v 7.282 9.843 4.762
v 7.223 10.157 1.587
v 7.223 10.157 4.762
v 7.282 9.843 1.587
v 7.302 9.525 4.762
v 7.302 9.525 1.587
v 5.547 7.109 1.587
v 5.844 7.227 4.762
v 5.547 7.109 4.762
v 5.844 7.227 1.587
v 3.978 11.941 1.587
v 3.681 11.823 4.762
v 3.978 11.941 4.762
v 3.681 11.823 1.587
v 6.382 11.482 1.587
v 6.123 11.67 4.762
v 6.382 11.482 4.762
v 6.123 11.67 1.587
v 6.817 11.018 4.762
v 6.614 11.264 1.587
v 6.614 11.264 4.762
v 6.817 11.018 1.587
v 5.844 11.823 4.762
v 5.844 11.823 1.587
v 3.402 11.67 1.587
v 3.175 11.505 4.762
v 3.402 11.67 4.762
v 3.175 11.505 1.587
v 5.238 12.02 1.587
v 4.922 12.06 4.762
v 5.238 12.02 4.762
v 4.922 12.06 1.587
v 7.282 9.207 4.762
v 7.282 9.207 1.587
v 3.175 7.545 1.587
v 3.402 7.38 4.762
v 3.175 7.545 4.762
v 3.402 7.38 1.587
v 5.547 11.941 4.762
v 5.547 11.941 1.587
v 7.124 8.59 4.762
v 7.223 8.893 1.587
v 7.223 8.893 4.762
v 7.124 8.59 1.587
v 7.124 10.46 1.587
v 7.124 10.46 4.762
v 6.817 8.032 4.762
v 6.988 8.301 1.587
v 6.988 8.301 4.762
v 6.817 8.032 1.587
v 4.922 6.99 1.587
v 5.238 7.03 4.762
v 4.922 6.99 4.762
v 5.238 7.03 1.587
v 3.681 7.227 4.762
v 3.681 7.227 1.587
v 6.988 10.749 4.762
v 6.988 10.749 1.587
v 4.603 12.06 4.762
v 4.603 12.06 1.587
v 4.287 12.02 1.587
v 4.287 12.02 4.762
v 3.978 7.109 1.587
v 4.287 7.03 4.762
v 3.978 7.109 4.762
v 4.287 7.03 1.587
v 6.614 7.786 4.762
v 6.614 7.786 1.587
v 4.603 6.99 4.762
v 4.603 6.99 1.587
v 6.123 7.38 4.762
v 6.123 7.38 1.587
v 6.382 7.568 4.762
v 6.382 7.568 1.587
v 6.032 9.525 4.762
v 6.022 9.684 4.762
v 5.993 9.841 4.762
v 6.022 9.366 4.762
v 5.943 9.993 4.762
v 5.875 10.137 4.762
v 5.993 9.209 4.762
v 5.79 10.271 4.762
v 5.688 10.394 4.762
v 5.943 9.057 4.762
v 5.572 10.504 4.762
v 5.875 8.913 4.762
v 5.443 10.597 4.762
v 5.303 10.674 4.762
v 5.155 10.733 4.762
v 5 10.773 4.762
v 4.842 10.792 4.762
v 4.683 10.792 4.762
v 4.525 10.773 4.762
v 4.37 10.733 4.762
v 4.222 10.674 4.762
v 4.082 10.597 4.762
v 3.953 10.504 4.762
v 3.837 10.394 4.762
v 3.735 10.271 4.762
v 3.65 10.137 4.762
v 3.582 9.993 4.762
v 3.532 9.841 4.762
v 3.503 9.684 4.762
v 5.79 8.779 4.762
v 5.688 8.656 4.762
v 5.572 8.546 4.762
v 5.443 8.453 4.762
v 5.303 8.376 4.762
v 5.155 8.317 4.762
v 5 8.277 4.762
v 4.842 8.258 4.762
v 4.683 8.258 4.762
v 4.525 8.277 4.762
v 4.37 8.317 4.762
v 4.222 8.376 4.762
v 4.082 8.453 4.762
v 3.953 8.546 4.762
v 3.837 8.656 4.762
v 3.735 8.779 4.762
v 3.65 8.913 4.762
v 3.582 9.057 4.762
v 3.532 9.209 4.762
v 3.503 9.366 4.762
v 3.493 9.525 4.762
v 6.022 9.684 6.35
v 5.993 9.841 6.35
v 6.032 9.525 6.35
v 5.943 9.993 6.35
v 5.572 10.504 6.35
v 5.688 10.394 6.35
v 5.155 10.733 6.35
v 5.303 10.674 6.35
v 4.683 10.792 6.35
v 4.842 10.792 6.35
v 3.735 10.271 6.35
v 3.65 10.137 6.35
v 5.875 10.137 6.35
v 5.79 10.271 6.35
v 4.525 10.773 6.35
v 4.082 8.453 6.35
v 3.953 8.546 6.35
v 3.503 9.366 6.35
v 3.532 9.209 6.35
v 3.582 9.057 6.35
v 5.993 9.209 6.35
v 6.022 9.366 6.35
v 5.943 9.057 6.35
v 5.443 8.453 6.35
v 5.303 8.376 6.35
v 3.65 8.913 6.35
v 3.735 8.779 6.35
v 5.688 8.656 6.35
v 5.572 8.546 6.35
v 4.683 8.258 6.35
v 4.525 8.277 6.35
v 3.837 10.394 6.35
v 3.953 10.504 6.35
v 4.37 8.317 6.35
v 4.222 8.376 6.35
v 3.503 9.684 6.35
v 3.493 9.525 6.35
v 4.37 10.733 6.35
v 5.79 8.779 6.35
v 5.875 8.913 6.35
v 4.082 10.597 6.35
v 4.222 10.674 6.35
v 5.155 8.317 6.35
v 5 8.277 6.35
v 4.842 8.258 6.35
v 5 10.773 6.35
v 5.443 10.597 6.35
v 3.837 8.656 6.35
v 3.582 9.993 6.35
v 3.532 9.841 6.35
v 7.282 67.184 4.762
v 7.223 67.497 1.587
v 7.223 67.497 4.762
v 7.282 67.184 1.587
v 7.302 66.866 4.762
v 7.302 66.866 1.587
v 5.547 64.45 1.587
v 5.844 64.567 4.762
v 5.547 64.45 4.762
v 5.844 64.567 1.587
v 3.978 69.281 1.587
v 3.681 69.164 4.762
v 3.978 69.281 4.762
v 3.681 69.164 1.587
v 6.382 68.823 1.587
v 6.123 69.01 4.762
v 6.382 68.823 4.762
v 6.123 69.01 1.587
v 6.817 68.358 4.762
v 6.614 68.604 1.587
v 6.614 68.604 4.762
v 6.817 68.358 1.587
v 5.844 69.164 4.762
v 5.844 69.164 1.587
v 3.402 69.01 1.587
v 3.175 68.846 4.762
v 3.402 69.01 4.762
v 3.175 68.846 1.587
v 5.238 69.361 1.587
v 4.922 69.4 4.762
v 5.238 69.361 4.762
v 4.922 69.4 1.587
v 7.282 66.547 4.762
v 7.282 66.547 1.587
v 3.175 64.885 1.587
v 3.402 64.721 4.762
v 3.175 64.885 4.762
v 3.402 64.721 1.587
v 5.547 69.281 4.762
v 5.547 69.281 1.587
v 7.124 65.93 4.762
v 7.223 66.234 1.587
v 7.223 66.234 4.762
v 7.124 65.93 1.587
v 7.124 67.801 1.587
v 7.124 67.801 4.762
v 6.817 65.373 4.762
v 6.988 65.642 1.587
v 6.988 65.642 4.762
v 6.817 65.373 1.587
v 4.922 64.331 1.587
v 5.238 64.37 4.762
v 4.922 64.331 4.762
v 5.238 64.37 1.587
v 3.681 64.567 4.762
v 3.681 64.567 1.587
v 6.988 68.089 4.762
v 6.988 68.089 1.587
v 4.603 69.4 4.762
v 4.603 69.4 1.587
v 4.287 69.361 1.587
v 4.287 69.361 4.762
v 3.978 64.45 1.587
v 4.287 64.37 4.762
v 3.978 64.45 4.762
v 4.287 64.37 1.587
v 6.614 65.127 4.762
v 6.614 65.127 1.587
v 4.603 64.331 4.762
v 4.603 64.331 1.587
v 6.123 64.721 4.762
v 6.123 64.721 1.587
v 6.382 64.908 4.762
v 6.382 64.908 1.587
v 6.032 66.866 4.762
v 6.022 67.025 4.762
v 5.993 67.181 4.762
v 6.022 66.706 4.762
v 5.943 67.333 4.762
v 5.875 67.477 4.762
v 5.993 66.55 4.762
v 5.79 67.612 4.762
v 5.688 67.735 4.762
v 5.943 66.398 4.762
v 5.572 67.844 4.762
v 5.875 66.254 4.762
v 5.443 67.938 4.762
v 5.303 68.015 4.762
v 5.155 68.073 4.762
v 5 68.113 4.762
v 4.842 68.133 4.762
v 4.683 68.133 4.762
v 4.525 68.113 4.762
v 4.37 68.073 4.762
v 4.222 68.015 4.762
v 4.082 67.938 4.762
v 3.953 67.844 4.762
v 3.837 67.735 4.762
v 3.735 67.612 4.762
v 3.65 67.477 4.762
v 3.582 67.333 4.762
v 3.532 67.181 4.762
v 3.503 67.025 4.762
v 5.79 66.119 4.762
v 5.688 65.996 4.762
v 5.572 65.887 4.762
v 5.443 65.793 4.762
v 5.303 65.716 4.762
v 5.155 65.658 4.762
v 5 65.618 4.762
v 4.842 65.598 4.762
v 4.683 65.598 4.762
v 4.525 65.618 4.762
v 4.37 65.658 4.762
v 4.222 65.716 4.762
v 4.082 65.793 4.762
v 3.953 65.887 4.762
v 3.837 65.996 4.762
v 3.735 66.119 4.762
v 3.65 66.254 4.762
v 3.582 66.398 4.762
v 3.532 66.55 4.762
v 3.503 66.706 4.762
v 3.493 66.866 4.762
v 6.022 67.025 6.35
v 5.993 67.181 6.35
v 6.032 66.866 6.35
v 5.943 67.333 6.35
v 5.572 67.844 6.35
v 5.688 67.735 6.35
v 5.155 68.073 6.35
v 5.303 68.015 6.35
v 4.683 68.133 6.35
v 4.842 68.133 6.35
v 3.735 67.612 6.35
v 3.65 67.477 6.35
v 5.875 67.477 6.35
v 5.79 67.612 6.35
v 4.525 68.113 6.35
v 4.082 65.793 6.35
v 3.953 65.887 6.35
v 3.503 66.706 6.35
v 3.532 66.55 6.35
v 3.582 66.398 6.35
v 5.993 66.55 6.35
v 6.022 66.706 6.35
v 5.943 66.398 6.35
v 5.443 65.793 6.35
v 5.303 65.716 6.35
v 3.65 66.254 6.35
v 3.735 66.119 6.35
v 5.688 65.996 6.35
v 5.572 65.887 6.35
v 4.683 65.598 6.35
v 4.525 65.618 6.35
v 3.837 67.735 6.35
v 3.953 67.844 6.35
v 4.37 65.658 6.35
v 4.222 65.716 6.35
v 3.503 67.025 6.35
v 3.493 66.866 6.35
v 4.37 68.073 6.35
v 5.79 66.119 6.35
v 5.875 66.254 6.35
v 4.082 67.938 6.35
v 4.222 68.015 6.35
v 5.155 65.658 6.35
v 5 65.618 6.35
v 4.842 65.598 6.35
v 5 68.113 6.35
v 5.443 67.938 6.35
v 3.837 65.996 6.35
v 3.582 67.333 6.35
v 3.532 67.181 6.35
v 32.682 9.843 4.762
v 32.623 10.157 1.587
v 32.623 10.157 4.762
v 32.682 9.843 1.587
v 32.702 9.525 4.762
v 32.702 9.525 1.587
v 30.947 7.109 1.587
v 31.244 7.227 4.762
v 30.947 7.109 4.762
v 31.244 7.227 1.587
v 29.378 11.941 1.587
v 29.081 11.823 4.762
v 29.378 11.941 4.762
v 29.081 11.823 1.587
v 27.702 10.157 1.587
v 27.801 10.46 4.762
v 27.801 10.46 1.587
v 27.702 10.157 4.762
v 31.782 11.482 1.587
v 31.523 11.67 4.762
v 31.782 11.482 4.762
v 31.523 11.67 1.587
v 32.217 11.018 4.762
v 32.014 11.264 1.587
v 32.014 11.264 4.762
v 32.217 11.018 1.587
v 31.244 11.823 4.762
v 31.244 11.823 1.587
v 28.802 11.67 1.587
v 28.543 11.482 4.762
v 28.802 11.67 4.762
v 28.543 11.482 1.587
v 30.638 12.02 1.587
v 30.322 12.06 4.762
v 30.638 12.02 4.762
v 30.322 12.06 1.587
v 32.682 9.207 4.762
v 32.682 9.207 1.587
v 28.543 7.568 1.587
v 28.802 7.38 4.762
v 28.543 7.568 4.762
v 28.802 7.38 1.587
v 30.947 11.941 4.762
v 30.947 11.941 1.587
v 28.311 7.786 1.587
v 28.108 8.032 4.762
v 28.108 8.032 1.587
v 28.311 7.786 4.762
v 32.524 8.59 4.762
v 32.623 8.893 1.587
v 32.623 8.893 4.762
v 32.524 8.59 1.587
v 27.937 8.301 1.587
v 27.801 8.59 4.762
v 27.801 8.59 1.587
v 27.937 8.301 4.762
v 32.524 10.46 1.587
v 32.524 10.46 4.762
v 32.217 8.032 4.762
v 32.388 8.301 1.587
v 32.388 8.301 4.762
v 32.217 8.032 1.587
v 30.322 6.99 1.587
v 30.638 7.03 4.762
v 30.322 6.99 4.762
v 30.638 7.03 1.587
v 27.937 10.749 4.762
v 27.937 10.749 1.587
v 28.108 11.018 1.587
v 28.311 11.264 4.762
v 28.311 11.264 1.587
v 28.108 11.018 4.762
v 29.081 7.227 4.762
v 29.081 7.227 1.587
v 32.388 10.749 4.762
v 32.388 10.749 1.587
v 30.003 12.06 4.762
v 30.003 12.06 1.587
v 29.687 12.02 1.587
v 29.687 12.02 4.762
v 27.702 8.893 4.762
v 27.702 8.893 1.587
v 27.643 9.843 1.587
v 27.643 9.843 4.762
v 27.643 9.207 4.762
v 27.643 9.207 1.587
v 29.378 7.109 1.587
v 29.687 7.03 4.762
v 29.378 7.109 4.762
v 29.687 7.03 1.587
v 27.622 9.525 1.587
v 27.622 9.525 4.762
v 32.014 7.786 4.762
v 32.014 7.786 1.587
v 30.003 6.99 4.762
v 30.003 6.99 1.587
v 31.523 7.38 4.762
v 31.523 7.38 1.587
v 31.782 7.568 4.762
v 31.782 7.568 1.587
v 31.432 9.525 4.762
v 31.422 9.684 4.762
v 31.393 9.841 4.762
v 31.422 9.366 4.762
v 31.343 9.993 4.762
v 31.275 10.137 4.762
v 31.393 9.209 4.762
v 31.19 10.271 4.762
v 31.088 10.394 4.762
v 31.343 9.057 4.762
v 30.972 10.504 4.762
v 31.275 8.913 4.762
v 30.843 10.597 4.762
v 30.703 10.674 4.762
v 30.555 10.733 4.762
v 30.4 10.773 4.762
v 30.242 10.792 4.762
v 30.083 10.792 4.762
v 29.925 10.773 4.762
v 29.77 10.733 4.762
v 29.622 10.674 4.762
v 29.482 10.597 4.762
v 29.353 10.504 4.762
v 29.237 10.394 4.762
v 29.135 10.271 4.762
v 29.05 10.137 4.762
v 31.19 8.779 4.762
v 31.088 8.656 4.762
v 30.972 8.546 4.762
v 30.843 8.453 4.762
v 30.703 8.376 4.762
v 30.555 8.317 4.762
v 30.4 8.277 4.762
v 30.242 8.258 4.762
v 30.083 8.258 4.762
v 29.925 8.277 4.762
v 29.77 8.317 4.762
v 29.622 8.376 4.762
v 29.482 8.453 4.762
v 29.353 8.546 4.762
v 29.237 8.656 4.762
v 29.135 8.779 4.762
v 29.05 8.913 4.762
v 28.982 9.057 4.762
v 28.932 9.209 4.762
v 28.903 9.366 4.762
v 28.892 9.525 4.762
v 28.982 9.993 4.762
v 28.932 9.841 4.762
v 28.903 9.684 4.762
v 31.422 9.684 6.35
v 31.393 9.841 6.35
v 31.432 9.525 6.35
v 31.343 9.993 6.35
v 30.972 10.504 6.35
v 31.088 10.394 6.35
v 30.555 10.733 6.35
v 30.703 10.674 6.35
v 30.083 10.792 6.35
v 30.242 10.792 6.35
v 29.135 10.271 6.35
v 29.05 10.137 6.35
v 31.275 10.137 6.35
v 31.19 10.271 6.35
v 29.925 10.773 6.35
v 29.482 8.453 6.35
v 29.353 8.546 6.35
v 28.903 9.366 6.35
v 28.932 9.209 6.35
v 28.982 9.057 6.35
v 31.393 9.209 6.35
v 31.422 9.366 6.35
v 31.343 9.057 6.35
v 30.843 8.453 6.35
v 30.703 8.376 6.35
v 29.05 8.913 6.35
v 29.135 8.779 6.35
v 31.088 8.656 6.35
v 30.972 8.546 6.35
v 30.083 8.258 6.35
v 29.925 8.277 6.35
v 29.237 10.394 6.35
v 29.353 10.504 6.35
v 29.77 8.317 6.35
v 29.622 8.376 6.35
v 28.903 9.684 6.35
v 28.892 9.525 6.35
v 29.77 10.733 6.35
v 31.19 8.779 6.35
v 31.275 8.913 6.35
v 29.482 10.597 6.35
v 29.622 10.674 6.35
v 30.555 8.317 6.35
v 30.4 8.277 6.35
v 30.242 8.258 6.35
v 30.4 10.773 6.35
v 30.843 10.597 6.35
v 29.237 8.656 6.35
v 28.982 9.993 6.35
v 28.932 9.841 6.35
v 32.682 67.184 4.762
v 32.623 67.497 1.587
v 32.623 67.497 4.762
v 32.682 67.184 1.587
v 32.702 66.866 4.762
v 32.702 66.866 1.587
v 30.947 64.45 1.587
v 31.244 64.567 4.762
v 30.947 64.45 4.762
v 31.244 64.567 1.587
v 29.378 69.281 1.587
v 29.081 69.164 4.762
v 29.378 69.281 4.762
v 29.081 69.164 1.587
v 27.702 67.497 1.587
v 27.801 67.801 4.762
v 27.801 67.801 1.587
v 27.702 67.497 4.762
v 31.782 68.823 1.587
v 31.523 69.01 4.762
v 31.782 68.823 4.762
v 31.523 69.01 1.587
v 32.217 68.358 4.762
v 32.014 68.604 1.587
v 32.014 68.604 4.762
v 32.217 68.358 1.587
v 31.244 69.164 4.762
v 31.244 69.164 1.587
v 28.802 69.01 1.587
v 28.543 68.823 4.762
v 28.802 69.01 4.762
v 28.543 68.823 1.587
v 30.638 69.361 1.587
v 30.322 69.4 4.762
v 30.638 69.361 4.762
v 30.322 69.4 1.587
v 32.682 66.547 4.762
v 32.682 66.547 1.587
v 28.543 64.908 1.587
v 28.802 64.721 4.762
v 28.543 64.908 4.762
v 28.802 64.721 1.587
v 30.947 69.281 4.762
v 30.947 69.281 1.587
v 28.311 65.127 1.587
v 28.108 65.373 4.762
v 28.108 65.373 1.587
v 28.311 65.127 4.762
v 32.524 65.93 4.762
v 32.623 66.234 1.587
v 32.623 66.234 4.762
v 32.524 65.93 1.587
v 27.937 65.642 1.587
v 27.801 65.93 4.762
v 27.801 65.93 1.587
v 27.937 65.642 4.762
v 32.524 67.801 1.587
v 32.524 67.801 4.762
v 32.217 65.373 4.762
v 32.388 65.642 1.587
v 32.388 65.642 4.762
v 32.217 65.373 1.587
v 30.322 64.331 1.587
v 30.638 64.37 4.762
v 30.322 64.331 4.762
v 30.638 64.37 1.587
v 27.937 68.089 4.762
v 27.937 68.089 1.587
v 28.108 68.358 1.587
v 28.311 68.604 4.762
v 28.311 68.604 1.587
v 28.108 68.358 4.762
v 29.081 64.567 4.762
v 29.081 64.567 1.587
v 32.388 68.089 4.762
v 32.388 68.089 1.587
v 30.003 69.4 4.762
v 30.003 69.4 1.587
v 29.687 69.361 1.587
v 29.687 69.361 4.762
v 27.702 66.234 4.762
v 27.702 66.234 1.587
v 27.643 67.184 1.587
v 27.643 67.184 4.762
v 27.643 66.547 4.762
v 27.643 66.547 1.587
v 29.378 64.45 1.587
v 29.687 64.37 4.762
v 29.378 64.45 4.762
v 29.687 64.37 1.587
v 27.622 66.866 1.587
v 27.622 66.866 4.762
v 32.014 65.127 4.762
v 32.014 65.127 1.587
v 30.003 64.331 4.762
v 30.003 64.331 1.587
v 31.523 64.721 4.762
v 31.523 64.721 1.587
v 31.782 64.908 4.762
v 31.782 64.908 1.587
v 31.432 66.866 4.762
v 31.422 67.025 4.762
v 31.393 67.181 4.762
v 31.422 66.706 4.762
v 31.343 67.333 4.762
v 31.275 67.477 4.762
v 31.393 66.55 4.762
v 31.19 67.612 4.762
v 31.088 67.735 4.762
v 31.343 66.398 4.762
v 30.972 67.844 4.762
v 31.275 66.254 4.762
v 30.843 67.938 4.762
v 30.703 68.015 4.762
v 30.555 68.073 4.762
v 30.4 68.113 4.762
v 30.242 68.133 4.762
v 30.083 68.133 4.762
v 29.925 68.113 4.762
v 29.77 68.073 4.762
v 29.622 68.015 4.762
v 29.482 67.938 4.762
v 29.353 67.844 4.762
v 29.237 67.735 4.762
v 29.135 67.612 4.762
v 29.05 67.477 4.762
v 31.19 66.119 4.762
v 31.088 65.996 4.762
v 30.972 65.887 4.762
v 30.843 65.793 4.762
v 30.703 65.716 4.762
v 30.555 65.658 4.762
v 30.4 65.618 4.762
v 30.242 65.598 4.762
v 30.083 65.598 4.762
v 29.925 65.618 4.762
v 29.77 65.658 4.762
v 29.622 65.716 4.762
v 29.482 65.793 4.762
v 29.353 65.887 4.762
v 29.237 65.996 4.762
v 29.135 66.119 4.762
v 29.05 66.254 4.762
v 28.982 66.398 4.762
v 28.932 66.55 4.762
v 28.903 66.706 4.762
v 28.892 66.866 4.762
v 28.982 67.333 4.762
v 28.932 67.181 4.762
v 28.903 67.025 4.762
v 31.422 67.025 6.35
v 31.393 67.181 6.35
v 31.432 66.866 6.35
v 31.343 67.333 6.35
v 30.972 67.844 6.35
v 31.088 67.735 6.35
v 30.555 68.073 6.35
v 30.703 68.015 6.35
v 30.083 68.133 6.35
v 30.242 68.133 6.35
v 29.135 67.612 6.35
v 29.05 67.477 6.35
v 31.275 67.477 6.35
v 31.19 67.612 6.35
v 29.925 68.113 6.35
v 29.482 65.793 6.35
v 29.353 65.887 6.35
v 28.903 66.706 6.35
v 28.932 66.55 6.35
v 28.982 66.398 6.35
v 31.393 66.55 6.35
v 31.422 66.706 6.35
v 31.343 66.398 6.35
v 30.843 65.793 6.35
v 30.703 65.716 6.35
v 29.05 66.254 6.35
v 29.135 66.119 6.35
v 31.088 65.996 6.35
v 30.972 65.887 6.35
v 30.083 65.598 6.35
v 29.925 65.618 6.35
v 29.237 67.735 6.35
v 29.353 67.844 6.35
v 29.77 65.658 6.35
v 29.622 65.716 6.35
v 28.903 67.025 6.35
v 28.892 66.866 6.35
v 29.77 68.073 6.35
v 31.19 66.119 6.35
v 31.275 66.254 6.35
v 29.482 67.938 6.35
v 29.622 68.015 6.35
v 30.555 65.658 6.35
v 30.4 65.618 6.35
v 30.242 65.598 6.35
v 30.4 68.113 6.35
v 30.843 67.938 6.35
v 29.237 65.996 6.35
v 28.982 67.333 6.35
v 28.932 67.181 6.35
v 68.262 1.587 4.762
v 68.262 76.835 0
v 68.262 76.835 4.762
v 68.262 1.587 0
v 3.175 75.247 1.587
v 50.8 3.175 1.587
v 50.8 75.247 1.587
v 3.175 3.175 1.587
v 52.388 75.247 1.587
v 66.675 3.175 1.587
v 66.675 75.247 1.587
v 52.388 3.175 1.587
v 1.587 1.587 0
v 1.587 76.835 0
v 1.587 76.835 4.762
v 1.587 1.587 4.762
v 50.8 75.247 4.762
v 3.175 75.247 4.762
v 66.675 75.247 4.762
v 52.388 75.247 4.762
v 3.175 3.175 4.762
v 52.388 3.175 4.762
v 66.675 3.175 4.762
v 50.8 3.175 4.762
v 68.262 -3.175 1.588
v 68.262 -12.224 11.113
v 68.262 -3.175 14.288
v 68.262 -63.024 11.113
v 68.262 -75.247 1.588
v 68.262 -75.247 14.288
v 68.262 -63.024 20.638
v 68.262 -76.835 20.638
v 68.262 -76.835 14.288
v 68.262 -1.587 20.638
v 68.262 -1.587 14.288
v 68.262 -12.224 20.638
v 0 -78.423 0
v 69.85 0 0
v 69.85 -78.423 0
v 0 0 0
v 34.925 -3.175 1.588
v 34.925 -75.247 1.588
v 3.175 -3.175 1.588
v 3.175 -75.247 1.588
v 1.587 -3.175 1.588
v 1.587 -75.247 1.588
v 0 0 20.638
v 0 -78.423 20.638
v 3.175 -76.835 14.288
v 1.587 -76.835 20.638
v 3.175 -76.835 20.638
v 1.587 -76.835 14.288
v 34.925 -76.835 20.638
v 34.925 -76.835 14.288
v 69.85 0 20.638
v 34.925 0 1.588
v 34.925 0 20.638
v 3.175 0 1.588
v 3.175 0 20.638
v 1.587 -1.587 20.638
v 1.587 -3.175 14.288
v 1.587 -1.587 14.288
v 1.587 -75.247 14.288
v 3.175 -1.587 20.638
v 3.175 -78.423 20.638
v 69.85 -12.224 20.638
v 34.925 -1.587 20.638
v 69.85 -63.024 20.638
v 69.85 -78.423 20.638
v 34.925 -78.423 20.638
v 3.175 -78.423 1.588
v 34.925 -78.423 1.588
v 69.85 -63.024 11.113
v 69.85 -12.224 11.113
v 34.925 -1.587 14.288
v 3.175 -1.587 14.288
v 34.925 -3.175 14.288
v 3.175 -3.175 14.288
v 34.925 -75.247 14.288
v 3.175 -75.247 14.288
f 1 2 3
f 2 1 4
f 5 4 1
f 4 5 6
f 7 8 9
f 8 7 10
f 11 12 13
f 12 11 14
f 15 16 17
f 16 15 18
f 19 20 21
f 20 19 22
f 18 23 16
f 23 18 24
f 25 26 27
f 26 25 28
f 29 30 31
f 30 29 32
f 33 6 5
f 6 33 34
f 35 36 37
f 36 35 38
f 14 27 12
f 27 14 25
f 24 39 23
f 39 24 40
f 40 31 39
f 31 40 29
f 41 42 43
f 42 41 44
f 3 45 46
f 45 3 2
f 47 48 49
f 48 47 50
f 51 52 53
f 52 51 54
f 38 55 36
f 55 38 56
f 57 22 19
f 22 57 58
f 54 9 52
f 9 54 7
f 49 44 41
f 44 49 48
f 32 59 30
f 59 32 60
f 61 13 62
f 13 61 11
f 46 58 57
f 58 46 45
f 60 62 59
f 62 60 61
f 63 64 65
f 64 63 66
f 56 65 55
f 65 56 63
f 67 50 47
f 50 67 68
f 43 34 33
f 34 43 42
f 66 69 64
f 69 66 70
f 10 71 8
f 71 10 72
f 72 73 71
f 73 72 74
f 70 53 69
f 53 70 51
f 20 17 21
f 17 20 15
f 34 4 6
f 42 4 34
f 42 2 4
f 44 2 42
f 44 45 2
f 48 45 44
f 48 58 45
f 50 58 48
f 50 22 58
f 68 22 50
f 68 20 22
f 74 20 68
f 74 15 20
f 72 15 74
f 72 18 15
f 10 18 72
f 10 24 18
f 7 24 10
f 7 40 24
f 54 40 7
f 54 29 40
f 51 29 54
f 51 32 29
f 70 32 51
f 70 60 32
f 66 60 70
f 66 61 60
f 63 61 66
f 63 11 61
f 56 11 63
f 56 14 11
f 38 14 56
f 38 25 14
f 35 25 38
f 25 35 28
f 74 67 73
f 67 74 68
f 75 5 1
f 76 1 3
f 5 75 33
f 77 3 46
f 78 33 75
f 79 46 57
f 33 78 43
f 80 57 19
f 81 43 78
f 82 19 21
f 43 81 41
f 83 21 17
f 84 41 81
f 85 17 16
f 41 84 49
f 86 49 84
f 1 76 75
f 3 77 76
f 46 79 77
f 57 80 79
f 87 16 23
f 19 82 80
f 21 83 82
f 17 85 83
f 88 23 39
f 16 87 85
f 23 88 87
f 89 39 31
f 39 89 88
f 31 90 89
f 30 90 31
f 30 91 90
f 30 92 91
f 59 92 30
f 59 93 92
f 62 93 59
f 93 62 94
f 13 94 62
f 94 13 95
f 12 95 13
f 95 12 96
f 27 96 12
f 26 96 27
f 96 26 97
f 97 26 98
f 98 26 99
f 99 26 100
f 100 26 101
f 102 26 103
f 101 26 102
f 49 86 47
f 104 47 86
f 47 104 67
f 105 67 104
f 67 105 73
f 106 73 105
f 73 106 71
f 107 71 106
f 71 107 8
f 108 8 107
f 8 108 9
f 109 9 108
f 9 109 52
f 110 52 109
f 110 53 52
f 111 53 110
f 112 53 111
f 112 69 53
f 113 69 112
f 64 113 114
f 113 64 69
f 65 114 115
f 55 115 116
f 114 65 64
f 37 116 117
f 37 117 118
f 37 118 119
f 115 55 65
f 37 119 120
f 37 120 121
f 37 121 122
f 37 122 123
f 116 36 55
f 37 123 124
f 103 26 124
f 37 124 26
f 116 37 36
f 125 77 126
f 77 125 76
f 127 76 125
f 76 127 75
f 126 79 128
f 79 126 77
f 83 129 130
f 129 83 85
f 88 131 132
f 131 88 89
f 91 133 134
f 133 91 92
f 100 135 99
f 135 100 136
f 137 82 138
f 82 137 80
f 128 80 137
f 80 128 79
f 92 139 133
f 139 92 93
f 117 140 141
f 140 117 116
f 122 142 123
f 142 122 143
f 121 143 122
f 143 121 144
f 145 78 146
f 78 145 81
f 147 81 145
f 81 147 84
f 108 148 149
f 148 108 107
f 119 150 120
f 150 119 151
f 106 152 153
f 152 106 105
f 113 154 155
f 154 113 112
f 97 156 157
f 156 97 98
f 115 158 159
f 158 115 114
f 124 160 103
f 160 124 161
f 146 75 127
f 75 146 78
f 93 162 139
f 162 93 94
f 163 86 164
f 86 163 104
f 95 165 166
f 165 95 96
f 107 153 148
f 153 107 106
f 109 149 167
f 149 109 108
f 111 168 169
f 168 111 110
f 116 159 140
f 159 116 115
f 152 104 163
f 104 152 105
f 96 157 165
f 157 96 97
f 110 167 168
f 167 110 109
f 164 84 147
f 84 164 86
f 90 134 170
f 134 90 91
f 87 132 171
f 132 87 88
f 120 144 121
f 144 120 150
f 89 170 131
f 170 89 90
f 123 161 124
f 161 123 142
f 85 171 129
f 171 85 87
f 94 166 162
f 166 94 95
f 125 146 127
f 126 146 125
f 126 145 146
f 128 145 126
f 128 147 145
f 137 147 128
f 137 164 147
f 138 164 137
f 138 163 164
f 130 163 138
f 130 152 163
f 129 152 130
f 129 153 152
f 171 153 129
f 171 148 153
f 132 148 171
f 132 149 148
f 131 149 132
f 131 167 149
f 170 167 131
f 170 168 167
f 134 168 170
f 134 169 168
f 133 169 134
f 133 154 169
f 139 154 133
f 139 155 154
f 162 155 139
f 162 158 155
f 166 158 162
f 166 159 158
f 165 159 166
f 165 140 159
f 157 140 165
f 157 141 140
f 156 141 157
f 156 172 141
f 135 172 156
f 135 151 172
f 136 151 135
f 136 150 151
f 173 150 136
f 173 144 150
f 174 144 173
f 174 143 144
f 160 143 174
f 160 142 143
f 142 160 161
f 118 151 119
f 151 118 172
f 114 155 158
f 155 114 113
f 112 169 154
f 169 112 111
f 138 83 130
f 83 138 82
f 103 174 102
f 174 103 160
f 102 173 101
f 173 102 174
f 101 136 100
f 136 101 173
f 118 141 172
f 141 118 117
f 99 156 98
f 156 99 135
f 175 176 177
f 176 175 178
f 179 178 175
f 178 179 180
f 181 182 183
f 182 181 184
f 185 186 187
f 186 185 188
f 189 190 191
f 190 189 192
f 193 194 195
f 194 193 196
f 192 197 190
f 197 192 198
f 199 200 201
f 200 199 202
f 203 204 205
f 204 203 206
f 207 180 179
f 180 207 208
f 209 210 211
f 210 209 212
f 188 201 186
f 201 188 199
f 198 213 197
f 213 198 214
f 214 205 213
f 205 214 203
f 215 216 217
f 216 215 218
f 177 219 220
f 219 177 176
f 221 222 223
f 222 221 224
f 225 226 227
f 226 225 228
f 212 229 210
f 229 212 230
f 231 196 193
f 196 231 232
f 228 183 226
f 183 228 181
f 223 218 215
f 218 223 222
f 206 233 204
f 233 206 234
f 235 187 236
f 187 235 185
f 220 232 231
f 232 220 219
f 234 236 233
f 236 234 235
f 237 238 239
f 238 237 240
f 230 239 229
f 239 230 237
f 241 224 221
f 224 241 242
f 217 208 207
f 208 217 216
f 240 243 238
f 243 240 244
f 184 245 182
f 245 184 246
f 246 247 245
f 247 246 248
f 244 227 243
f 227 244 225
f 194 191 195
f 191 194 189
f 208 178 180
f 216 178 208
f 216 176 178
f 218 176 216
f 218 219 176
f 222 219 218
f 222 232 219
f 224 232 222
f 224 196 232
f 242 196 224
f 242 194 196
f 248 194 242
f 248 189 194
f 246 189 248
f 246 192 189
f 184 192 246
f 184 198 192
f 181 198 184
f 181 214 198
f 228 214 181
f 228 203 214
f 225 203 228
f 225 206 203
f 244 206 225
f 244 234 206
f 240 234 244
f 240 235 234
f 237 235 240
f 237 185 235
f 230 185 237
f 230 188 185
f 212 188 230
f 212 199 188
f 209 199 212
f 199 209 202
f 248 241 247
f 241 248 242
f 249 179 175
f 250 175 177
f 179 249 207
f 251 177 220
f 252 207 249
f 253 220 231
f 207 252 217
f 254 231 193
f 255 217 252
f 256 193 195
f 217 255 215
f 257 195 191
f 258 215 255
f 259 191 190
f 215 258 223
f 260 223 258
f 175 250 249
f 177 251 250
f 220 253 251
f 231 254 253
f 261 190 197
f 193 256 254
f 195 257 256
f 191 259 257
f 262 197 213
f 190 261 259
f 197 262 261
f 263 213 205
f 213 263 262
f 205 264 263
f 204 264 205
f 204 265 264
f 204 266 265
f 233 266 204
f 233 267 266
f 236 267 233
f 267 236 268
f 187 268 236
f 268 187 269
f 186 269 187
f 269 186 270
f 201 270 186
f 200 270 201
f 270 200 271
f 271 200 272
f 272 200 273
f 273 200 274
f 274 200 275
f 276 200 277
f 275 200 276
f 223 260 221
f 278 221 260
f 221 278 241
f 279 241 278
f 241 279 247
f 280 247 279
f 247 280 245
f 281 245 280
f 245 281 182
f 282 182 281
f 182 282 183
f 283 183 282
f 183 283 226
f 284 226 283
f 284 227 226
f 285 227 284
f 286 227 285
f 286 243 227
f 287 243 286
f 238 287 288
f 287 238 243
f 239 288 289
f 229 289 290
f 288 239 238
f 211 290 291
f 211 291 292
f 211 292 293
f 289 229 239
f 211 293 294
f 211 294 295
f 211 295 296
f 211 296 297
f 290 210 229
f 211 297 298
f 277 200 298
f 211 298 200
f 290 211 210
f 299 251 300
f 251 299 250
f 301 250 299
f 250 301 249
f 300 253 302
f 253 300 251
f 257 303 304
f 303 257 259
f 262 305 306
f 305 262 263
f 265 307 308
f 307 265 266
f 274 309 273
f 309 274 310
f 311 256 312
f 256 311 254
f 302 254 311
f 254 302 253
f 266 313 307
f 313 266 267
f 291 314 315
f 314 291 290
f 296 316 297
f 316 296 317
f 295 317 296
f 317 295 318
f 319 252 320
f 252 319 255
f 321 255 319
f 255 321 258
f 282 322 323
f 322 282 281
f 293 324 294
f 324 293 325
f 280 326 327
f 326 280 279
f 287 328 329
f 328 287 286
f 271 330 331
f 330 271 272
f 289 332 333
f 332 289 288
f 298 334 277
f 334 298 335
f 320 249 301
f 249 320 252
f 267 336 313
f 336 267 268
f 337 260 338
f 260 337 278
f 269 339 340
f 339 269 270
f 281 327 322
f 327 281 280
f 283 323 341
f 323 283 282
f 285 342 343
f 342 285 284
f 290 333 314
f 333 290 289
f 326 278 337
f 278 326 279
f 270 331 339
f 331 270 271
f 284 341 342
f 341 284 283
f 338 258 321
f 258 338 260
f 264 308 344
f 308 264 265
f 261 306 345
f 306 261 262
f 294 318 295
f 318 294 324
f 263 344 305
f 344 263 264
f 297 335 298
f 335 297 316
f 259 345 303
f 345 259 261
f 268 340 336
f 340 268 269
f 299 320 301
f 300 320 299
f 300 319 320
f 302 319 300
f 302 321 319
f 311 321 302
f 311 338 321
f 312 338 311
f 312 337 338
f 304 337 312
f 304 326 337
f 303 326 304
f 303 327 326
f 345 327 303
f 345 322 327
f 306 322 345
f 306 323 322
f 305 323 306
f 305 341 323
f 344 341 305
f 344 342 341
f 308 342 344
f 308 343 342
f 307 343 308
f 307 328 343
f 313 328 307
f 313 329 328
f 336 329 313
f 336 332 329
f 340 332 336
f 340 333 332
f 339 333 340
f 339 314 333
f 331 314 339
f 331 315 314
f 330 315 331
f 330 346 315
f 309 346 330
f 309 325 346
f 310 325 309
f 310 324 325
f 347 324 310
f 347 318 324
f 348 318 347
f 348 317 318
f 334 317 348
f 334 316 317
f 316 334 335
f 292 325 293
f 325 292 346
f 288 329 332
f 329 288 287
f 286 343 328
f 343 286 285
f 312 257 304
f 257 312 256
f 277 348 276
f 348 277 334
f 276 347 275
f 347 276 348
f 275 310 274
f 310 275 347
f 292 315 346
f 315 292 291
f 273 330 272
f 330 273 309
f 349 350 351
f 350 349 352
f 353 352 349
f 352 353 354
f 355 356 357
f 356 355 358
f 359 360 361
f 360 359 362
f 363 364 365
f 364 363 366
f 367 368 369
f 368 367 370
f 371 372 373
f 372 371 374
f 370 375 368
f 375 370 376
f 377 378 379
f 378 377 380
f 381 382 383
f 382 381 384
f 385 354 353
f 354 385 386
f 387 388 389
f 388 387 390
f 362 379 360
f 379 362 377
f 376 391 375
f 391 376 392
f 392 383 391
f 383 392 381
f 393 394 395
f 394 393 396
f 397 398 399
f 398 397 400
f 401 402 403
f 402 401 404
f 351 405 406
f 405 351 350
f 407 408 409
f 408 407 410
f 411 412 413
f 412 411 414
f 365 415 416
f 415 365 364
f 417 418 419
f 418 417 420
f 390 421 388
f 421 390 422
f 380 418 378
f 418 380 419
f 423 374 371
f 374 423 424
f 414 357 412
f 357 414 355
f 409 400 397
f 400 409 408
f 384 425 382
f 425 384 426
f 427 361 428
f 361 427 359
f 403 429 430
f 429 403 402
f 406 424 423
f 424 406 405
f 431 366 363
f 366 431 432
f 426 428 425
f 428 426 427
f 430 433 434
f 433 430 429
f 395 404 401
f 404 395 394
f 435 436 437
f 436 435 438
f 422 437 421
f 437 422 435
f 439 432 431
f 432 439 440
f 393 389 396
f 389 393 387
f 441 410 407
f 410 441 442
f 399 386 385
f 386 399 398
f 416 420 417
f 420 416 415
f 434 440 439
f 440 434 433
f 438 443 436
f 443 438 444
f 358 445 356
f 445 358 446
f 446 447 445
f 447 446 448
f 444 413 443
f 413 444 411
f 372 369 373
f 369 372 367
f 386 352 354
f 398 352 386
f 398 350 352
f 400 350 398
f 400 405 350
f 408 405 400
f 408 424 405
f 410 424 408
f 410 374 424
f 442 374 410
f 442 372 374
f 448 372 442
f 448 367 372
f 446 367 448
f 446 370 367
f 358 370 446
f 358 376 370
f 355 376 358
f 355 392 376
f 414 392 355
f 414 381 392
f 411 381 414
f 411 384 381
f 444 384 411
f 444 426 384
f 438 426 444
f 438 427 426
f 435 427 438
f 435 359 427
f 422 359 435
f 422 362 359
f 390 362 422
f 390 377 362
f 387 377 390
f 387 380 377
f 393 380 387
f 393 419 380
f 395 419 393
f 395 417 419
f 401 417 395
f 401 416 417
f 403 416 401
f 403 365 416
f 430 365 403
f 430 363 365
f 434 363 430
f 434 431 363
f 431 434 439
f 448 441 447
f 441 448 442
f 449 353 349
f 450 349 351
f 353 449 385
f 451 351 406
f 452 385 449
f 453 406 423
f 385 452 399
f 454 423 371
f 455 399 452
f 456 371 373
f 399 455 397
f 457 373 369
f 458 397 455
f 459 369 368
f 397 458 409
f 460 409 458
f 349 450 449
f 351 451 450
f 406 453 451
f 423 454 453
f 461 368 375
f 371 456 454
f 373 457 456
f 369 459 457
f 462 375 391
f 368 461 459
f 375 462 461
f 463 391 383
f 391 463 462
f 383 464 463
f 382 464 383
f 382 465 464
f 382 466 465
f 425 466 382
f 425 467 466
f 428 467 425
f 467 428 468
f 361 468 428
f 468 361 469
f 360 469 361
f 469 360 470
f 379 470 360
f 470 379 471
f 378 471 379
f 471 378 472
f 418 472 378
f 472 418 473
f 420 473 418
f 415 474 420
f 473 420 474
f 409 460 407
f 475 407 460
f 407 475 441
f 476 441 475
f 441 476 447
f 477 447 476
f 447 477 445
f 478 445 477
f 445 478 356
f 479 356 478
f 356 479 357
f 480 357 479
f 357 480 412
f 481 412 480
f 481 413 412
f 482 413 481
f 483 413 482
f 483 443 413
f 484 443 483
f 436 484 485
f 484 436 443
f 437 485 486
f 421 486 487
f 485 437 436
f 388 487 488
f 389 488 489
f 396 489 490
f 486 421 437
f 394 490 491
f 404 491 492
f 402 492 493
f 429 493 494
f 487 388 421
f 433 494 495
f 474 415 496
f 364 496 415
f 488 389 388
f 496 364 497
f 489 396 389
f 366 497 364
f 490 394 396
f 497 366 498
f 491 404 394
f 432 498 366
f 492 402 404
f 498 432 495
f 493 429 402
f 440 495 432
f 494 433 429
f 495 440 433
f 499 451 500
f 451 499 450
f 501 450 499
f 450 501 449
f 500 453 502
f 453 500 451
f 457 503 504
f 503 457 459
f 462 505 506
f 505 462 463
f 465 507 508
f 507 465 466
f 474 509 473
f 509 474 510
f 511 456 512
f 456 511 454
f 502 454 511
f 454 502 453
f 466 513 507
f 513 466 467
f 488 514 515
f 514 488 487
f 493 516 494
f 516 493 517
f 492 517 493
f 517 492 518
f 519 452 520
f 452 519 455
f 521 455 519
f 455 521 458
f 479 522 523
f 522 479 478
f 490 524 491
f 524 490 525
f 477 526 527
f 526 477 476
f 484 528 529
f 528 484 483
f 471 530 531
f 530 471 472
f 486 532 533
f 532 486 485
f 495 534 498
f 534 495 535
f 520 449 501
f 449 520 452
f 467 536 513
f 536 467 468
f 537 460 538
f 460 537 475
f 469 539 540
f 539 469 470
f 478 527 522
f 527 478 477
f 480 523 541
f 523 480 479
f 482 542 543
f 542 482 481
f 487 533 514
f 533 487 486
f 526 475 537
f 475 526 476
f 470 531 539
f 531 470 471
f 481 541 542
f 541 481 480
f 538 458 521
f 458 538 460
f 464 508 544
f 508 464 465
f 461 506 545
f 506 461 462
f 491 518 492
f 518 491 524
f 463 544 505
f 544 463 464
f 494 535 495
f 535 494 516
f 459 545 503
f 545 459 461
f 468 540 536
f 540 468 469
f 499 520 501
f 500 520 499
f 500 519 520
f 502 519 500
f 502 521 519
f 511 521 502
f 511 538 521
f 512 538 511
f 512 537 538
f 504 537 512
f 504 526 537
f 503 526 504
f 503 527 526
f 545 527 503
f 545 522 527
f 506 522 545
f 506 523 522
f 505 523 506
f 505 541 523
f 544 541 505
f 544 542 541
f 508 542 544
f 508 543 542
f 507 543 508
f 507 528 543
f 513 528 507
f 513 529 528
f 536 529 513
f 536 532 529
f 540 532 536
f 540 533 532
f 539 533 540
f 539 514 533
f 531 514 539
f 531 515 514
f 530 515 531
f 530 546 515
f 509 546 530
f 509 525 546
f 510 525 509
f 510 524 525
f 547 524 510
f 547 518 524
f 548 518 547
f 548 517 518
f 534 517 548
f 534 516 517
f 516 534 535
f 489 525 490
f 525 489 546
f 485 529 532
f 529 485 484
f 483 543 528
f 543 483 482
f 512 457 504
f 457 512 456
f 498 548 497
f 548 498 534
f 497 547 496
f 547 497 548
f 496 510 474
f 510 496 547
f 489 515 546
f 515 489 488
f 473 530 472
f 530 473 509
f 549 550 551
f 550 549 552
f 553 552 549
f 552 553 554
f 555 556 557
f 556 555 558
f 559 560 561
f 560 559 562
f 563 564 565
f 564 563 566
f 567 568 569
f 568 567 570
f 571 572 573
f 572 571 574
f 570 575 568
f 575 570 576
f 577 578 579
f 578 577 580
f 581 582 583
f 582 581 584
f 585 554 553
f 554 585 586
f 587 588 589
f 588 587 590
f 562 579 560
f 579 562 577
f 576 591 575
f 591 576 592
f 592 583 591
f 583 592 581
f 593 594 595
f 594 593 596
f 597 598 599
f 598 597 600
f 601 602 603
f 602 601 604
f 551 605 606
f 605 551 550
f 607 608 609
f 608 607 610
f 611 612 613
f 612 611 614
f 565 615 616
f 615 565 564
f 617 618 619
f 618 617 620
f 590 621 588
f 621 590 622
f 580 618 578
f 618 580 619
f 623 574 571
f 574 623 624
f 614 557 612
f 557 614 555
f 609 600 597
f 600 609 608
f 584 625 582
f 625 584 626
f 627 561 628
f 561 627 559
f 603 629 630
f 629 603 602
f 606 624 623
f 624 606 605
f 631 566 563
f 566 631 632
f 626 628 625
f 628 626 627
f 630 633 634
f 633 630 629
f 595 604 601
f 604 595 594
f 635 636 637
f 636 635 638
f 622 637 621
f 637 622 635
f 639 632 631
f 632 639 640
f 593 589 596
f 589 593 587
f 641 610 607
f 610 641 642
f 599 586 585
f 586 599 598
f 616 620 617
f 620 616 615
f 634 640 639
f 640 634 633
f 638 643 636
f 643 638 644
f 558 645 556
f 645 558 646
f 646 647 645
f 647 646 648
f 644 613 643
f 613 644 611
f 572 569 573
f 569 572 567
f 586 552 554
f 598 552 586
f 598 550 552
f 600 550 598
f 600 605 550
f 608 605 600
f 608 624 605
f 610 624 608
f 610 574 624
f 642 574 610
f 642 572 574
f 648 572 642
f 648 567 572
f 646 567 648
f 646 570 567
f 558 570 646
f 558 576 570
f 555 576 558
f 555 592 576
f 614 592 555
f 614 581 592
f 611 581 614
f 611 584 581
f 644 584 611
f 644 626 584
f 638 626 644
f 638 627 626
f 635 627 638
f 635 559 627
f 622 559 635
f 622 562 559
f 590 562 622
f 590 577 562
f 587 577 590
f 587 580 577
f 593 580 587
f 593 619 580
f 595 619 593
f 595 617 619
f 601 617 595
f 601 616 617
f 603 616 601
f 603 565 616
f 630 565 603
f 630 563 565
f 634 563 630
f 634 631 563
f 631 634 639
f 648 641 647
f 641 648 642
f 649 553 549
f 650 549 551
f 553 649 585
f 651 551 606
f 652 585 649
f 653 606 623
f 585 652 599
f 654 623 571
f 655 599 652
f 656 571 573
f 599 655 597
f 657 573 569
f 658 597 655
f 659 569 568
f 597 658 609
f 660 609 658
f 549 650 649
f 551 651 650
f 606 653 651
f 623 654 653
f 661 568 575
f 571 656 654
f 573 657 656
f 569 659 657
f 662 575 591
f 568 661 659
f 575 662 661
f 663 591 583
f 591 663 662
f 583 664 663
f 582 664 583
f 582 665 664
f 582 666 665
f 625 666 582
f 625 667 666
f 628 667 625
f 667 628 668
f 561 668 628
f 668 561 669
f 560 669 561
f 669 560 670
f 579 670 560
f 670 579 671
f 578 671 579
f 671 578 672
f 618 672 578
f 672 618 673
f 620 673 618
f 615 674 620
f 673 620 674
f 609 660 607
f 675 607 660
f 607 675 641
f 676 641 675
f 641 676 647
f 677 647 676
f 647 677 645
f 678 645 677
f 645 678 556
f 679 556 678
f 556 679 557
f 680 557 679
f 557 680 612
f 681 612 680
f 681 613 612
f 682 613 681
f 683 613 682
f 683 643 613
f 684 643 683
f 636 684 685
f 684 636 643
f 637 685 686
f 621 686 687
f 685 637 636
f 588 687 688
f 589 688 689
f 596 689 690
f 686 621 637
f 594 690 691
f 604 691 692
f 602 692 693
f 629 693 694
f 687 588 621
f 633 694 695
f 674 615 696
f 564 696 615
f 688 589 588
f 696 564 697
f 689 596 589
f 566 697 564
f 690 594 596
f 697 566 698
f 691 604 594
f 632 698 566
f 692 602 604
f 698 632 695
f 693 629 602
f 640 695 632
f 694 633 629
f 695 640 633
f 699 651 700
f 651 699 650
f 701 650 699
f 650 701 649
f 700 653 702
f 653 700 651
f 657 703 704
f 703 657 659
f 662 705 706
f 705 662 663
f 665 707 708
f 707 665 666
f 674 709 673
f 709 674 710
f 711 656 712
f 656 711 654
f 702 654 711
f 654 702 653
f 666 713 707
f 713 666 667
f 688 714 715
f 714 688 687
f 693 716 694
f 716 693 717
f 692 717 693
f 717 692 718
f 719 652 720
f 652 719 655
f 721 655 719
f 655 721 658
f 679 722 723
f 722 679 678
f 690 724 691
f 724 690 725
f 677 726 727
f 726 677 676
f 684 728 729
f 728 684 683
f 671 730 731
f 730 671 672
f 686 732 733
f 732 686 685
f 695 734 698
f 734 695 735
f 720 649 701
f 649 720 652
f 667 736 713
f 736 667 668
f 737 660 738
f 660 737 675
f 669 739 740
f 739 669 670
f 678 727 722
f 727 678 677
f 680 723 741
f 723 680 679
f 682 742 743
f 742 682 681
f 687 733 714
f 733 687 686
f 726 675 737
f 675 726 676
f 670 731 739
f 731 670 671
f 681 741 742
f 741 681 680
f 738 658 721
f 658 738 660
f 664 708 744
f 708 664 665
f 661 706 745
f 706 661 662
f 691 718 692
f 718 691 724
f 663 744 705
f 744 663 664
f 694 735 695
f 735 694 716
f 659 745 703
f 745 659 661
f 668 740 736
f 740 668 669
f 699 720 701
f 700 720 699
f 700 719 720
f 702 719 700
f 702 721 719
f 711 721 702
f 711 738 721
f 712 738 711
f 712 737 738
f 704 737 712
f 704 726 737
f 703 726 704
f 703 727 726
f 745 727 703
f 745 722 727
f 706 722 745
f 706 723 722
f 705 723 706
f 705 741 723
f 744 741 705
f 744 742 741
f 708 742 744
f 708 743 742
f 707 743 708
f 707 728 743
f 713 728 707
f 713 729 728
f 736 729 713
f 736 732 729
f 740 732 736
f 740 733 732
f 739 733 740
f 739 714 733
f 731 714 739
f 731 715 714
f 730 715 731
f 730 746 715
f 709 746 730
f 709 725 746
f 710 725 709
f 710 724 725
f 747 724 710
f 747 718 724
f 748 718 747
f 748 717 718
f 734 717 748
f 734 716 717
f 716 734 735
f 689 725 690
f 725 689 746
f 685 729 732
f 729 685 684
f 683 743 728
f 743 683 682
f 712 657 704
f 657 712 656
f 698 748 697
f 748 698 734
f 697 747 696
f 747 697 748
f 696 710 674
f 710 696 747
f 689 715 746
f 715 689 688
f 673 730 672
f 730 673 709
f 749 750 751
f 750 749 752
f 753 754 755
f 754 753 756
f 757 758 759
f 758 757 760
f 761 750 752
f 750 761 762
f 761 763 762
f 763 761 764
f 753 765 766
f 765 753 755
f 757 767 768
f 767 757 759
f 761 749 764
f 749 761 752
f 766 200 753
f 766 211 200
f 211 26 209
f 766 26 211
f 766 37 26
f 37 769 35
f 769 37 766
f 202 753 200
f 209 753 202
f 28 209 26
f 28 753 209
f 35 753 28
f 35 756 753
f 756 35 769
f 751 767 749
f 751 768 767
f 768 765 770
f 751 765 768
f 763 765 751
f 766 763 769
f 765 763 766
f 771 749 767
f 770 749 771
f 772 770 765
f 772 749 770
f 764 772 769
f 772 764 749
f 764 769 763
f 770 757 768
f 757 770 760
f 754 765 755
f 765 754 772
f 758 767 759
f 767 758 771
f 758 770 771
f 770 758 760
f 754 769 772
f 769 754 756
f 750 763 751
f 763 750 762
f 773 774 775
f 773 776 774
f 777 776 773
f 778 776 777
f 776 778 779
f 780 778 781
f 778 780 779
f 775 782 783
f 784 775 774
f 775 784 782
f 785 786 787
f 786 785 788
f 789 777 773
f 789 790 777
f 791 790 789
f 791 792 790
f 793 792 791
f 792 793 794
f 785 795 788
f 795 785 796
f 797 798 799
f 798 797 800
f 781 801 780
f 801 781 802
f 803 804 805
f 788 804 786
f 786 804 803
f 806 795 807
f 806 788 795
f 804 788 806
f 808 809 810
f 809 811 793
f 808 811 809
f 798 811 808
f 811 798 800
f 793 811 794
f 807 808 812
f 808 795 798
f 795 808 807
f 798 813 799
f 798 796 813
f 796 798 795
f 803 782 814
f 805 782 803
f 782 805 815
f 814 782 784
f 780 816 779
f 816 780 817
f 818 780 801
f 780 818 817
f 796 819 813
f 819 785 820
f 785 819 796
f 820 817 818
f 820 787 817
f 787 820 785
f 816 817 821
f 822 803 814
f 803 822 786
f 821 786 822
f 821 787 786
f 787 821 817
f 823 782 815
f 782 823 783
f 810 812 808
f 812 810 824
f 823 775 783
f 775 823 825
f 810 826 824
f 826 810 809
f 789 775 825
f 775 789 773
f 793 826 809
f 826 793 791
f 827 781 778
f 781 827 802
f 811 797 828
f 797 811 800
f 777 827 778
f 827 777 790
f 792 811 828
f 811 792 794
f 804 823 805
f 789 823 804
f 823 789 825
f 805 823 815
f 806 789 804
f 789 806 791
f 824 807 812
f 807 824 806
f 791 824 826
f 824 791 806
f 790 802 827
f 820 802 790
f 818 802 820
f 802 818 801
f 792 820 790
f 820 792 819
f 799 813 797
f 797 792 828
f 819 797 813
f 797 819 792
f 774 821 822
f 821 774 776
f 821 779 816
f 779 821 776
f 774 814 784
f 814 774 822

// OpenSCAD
// Initialization boilerplate
inch = 25.4; // mm
$fn=50;
thick = inch/16; //0.5; // mm wall thickness
slip = 0;//inch / 100; // friction fit
print = 1; // Position for printing

// Describe the PCB
pcbx = 2 * inch; // width
pcby = 2.9 * inch; // length
pcbz = inch/16; // thickness
over = 5/8 * inch; // IDC connector X overhang

// Describe the base.
// The base supports the PCB, and also
// covers the overhang.
baselx = thick + slip;
basely = thick + slip;
basehx = baselx + pcbx + over;
basehy = basely + pcby;
baselz = 0;
basehz = thick + inch/8;

// Post positions (to match detents in PCB)
detentlx = 1/8 * inch;;
detently = 5/16 * inch;
detenthx = detentlx + inch;
detenthy = 2.57 * inch;

splith = thick + inch/8 + pcbz;

// A post
module post() {
// cylinder(h=inch/8, d=inch/5);
   cylinder(h=splith-thick-pcbz, d=inch/5);
   cylinder(h=splith-pcbz, d=inch/10);
}

// Have enough now to draw the base.
module base() {
  // Base
  cube([basehx-baselx, basehy-basely, thick]);
  // Walls
  cube([thick, pcby, basehz]);
  translate([pcbx-thick, 0, 0])
    cube([thick, pcby, basehz]);
  translate([pcbx+over-thick, 0, 0])
    cube([thick, pcby, basehz]);
  cube([pcbx+over, thick, basehz]);
  translate([0, pcby, 0])
    cube([pcbx+over, thick, basehz]);
  // Detents
  translate([detentlx, detently, thick]) post();
  translate([detentlx, detenthy, thick]) post();
  translate([detenthx, detently, thick]) post();
  translate([detenthx, detenthy, thick]) post();
}

// Describe the PCB.
pcblx = thick + slip;
pcbly = thick + slip;
pcbhx = pcblx + pcbx;
pcbhy = pcbly + pcby;
pcblz = thick + inch/8 + slip;
pcbhz = pcblz + inch/16 + slip;

// Draw a PCB mock-up
module pcb() {
    cube([pcbhx-pcblx, pcbhy-pcbly, pcbhz-pcblz]);
}

// Outer box dimensions
boxh = 0.75 * inch;

boxlx = 0;
boxly = 0;
boxlz = 0;
boxhx = pcbhx + over + slip;
boxhy = pcbhy + thick + slip;
boxhz = pcbhz + inch / 2 + thick;

module top() {
  // Cap
  if (print) { // 0 for debugging
    translate([boxlx, boxly, boxhz-thick])
      cube([boxhx, boxhy, thick]);
  }
  // Walls
  cube([thick, thick+boxhy, boxhz]);
  translate([boxhx, 0, 0])
    cube([thick, boxhy, boxhz]);
  cube([boxhx, thick, boxhz]);
  translate([thick, boxhy, 0])
    cube([boxhx, thick, boxhz]);
  // Ridges
//The flush-mounted DE-9s prevent this ridge.
//translate([thick, 0, pcbhz+slip])
//  cube([thick, pcbhy+slip, thick]);
// The ribbon cable prevents this ridge.  
//translate([pcbhx-thick, 0, pcbhz+slip])
//  cube([thick, pcbhy+slip, thick]);
  translate([0, thick, pcbhz+slip])
    cube([boxhx, thick, boxhz-pcbhz-slip]);
  translate([0, boxhy-thick, pcbhz+slip])
    cube([boxhx, thick, boxhz-pcbhz-slip]);
}

module lid() {
  difference () {
    top();
    // subtract openings
    translate([2*thick, 0, 0])
      cube([1.25*inch, inch/8, pcbhz+inch/2]);
    translate([2*thick, pcbhy+slip, 0])
      cube([1.25*inch, inch/8, pcbhz+inch/2]);
    translate([boxhx, pcbhy/2 - inch, 0])
      cube([inch/8, 2*inch, pcbhz+inch/8]);
  }
}

if (print) {
  translate([baselx, basely, baselz]) base();
  translate([0, 0, boxhz])
    rotate([180, 0, 0])
      translate ([boxlx, boxly, boxlz]) lid();
} else {
  translate([baselx, basely, baselz]) base();
  translate([pcblx, pcbly, pcblz]) pcb();
  translate([boxlx, boxly, boxlz]) lid();
}
